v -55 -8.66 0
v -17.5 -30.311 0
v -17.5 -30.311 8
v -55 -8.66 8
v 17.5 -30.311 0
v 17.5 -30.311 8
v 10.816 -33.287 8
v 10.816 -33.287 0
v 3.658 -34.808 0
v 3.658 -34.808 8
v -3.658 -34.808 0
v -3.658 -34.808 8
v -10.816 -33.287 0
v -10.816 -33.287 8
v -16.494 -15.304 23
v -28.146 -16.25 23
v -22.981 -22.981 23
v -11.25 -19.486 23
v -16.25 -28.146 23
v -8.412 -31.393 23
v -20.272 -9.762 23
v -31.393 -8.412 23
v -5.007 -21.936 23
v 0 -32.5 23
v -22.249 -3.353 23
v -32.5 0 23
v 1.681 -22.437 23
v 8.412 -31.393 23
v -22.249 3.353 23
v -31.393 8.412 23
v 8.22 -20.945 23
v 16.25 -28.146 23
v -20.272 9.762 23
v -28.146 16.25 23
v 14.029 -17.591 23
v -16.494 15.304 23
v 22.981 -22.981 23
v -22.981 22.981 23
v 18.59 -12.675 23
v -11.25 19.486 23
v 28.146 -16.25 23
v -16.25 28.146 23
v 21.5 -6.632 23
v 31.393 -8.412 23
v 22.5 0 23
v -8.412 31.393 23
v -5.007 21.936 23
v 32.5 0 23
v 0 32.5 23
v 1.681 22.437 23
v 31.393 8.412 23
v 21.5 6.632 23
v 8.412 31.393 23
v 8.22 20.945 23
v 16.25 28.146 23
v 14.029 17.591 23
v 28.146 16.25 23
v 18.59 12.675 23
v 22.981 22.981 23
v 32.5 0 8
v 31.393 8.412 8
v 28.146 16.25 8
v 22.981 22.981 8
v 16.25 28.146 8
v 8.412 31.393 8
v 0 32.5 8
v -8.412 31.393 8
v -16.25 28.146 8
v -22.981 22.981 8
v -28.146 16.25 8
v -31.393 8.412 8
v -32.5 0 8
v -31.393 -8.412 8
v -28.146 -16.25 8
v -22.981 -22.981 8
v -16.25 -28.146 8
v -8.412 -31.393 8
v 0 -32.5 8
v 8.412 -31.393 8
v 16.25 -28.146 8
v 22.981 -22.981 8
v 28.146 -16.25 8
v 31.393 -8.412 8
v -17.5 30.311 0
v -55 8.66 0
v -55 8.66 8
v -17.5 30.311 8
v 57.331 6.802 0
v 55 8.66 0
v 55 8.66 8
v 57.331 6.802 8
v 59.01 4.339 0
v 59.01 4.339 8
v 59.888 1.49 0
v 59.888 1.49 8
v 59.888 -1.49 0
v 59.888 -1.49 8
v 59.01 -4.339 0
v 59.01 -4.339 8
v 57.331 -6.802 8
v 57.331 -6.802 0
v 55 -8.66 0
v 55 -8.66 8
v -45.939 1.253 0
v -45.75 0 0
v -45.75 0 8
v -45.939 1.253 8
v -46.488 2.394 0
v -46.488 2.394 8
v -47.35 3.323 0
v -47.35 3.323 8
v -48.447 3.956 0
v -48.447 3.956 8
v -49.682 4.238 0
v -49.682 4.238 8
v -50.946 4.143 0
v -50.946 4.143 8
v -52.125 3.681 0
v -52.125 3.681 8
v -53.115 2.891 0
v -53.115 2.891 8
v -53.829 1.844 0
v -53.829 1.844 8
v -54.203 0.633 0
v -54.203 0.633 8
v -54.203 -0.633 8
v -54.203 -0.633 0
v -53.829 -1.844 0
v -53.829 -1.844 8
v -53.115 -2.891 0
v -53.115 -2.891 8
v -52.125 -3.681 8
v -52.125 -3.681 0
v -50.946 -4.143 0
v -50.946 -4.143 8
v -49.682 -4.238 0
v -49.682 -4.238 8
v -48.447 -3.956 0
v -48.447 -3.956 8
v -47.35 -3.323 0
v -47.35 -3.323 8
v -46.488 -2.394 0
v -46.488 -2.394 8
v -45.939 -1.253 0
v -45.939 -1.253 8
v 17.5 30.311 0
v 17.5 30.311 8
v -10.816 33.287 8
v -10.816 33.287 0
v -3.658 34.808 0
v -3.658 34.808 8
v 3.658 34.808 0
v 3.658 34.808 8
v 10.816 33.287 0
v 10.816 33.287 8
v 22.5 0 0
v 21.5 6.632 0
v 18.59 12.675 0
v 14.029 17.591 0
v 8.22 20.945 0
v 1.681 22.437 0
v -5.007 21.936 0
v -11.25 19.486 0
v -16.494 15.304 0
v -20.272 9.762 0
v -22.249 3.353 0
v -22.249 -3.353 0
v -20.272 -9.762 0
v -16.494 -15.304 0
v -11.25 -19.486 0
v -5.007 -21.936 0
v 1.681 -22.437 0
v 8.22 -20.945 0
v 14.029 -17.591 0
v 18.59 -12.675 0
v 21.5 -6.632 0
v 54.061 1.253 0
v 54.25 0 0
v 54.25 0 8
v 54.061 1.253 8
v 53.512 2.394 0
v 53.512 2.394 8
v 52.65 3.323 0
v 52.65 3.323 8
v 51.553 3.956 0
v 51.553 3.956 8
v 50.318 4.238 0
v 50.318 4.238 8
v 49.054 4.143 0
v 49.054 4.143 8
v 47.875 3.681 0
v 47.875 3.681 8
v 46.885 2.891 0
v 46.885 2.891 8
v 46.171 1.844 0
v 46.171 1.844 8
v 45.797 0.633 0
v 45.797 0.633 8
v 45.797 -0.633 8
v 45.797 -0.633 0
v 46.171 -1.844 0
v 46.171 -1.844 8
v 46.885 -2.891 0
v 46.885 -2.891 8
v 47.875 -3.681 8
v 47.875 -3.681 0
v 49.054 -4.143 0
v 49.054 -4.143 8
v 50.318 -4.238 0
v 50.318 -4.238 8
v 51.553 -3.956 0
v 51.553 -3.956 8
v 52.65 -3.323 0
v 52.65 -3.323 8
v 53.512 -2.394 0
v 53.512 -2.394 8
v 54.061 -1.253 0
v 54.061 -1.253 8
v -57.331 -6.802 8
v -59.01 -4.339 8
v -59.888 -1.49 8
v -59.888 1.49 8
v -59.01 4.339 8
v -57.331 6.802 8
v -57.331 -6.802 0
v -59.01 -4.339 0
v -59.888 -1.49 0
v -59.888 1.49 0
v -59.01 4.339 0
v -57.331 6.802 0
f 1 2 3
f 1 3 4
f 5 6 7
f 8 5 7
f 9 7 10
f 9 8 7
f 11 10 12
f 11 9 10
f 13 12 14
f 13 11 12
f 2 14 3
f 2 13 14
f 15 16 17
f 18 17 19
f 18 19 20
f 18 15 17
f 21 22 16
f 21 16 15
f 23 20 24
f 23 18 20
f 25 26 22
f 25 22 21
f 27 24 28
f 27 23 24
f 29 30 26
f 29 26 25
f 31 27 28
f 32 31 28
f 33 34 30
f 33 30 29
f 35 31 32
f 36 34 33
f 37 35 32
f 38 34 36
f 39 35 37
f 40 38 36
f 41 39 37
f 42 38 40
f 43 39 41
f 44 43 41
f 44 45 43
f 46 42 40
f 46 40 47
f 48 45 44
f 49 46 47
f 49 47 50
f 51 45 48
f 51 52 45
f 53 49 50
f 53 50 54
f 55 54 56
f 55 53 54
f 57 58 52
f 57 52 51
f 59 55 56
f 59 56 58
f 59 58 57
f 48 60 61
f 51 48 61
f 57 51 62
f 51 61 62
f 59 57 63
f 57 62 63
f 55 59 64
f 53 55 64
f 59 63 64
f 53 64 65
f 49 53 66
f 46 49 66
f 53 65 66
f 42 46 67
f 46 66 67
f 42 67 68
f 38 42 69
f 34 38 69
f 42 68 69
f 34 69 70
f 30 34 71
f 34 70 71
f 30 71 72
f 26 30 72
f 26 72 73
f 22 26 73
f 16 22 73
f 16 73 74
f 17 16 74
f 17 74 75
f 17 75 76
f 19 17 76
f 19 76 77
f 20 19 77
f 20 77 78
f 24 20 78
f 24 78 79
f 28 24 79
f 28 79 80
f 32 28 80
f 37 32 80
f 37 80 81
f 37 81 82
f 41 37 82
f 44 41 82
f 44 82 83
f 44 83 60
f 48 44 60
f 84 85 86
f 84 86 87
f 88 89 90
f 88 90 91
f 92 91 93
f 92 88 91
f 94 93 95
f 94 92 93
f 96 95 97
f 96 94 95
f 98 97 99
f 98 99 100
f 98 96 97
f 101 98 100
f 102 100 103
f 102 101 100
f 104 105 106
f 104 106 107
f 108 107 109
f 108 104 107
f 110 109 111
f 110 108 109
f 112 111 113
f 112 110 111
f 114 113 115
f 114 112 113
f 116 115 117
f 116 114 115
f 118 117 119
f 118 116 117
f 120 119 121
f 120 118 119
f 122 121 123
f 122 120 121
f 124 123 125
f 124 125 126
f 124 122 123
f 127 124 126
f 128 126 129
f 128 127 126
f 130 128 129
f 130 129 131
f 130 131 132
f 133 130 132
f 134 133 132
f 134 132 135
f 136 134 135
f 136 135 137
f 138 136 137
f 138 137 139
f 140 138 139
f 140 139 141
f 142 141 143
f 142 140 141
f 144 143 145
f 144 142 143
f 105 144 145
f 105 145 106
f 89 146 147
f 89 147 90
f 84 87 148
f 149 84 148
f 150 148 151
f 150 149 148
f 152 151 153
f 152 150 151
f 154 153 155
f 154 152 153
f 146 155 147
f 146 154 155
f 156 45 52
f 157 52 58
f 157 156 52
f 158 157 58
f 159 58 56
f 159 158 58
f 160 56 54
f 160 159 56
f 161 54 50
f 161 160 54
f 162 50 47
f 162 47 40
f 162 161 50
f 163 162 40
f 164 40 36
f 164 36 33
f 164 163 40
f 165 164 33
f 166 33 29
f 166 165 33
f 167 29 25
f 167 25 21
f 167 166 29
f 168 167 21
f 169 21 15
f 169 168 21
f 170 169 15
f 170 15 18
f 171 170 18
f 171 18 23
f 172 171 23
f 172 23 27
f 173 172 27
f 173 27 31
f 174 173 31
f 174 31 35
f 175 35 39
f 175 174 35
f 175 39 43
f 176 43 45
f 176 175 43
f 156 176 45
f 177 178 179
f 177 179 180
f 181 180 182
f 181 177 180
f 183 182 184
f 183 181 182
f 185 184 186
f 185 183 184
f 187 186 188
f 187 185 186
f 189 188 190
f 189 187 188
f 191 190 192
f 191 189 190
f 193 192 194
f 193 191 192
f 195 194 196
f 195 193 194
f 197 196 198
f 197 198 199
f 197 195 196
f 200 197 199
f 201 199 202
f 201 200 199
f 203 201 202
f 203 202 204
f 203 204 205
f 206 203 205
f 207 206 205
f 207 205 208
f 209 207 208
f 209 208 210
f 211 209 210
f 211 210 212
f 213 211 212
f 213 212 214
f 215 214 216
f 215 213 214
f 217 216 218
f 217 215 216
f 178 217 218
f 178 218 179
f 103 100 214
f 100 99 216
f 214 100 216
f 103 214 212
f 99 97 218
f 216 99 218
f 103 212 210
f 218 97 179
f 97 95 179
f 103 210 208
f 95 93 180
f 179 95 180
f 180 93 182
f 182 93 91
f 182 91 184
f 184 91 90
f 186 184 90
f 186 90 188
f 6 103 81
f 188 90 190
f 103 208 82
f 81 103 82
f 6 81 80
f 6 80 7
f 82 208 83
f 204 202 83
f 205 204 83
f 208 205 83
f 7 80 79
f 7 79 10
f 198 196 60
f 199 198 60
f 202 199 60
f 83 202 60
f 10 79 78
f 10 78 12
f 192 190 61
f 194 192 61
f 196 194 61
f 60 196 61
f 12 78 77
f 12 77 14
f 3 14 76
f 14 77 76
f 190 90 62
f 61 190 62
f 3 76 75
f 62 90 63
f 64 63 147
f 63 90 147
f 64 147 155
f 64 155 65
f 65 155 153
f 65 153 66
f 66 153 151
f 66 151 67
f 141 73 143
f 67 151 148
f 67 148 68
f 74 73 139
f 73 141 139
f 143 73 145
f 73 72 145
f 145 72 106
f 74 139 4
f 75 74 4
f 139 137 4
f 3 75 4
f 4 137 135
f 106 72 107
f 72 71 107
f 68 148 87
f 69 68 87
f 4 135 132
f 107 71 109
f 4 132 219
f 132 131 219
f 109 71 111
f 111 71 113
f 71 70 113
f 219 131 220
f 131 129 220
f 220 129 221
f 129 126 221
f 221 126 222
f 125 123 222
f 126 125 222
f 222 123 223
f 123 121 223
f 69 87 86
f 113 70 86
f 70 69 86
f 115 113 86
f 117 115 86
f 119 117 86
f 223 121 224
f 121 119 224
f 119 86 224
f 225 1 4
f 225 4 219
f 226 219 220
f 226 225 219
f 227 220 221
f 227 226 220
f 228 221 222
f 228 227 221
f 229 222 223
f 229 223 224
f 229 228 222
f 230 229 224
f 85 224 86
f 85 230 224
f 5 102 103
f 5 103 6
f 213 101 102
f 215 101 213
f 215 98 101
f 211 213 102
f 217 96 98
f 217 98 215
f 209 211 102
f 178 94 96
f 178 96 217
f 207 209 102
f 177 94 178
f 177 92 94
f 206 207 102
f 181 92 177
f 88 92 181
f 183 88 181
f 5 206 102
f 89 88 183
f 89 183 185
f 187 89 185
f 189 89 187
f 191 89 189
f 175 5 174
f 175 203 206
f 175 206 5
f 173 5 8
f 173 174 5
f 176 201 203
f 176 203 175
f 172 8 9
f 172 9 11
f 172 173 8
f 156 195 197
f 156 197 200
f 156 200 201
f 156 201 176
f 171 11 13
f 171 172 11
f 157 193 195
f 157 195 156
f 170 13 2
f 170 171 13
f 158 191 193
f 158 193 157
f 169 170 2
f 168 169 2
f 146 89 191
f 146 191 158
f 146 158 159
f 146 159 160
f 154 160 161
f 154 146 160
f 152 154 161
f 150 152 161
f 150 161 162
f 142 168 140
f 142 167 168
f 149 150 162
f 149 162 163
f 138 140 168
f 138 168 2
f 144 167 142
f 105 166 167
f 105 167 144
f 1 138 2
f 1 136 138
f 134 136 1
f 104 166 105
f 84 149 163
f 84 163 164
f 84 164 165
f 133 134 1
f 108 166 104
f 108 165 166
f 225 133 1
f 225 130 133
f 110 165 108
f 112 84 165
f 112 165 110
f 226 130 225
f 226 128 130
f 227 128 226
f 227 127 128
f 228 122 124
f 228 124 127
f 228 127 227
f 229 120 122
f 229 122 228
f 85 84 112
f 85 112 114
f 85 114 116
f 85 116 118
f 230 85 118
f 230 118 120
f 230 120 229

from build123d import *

# Parameters (mm, degrees)
SKETCH2_R           = 4.25
SKETCH2_R_2         = 32.5
BOSS_EXTRUDE1_DEPTH = 8
SKETCH2_4_R         = 32.5
SKETCH2_4_R_2       = 22.5
BOSS_EXTRUDE2_DEPTH = 23


with BuildPart() as part:
    # Sketch2 → Boss-Extrude1 (new body)
    with BuildSketch(Plane.XY):
        with BuildLine():
            ThreePointArc((17.5, 30.310889132), (0, 35), (-17.5, 30.310889132))
            Line((-17.5, 30.310889132), (-55, 8.660254038))
            ThreePointArc((-55, 8.660254038), (-60, 0), (-55, -8.660254038))
            Line((-55, -8.660254038), (-17.5, -30.310889132))
            ThreePointArc((-17.5, -30.310889132), (0, -35), (17.5, -30.310889132))
            Line((17.5, -30.310889132), (55, -8.660254038))
            ThreePointArc((55, -8.660254038), (60, 0), (55, 8.660254038))
            Line((55, 8.660254038), (17.5, 30.310889132))
        make_face()
        with Locations((-50, 0)):
            Circle(SKETCH2_R, mode=Mode.SUBTRACT)
        Circle(SKETCH2_R_2, mode=Mode.SUBTRACT)
        with Locations((50, 0)):
            Circle(SKETCH2_R, mode=Mode.SUBTRACT)
    extrude(amount=BOSS_EXTRUDE1_DEPTH)

    # Sketch2<4> → Boss-Extrude2 (add)
    with BuildSketch(Plane.XY):
        Circle(SKETCH2_4_R)
        Circle(SKETCH2_4_R_2, mode=Mode.SUBTRACT)
    extrude(amount=BOSS_EXTRUDE2_DEPTH)


solid = part.part
